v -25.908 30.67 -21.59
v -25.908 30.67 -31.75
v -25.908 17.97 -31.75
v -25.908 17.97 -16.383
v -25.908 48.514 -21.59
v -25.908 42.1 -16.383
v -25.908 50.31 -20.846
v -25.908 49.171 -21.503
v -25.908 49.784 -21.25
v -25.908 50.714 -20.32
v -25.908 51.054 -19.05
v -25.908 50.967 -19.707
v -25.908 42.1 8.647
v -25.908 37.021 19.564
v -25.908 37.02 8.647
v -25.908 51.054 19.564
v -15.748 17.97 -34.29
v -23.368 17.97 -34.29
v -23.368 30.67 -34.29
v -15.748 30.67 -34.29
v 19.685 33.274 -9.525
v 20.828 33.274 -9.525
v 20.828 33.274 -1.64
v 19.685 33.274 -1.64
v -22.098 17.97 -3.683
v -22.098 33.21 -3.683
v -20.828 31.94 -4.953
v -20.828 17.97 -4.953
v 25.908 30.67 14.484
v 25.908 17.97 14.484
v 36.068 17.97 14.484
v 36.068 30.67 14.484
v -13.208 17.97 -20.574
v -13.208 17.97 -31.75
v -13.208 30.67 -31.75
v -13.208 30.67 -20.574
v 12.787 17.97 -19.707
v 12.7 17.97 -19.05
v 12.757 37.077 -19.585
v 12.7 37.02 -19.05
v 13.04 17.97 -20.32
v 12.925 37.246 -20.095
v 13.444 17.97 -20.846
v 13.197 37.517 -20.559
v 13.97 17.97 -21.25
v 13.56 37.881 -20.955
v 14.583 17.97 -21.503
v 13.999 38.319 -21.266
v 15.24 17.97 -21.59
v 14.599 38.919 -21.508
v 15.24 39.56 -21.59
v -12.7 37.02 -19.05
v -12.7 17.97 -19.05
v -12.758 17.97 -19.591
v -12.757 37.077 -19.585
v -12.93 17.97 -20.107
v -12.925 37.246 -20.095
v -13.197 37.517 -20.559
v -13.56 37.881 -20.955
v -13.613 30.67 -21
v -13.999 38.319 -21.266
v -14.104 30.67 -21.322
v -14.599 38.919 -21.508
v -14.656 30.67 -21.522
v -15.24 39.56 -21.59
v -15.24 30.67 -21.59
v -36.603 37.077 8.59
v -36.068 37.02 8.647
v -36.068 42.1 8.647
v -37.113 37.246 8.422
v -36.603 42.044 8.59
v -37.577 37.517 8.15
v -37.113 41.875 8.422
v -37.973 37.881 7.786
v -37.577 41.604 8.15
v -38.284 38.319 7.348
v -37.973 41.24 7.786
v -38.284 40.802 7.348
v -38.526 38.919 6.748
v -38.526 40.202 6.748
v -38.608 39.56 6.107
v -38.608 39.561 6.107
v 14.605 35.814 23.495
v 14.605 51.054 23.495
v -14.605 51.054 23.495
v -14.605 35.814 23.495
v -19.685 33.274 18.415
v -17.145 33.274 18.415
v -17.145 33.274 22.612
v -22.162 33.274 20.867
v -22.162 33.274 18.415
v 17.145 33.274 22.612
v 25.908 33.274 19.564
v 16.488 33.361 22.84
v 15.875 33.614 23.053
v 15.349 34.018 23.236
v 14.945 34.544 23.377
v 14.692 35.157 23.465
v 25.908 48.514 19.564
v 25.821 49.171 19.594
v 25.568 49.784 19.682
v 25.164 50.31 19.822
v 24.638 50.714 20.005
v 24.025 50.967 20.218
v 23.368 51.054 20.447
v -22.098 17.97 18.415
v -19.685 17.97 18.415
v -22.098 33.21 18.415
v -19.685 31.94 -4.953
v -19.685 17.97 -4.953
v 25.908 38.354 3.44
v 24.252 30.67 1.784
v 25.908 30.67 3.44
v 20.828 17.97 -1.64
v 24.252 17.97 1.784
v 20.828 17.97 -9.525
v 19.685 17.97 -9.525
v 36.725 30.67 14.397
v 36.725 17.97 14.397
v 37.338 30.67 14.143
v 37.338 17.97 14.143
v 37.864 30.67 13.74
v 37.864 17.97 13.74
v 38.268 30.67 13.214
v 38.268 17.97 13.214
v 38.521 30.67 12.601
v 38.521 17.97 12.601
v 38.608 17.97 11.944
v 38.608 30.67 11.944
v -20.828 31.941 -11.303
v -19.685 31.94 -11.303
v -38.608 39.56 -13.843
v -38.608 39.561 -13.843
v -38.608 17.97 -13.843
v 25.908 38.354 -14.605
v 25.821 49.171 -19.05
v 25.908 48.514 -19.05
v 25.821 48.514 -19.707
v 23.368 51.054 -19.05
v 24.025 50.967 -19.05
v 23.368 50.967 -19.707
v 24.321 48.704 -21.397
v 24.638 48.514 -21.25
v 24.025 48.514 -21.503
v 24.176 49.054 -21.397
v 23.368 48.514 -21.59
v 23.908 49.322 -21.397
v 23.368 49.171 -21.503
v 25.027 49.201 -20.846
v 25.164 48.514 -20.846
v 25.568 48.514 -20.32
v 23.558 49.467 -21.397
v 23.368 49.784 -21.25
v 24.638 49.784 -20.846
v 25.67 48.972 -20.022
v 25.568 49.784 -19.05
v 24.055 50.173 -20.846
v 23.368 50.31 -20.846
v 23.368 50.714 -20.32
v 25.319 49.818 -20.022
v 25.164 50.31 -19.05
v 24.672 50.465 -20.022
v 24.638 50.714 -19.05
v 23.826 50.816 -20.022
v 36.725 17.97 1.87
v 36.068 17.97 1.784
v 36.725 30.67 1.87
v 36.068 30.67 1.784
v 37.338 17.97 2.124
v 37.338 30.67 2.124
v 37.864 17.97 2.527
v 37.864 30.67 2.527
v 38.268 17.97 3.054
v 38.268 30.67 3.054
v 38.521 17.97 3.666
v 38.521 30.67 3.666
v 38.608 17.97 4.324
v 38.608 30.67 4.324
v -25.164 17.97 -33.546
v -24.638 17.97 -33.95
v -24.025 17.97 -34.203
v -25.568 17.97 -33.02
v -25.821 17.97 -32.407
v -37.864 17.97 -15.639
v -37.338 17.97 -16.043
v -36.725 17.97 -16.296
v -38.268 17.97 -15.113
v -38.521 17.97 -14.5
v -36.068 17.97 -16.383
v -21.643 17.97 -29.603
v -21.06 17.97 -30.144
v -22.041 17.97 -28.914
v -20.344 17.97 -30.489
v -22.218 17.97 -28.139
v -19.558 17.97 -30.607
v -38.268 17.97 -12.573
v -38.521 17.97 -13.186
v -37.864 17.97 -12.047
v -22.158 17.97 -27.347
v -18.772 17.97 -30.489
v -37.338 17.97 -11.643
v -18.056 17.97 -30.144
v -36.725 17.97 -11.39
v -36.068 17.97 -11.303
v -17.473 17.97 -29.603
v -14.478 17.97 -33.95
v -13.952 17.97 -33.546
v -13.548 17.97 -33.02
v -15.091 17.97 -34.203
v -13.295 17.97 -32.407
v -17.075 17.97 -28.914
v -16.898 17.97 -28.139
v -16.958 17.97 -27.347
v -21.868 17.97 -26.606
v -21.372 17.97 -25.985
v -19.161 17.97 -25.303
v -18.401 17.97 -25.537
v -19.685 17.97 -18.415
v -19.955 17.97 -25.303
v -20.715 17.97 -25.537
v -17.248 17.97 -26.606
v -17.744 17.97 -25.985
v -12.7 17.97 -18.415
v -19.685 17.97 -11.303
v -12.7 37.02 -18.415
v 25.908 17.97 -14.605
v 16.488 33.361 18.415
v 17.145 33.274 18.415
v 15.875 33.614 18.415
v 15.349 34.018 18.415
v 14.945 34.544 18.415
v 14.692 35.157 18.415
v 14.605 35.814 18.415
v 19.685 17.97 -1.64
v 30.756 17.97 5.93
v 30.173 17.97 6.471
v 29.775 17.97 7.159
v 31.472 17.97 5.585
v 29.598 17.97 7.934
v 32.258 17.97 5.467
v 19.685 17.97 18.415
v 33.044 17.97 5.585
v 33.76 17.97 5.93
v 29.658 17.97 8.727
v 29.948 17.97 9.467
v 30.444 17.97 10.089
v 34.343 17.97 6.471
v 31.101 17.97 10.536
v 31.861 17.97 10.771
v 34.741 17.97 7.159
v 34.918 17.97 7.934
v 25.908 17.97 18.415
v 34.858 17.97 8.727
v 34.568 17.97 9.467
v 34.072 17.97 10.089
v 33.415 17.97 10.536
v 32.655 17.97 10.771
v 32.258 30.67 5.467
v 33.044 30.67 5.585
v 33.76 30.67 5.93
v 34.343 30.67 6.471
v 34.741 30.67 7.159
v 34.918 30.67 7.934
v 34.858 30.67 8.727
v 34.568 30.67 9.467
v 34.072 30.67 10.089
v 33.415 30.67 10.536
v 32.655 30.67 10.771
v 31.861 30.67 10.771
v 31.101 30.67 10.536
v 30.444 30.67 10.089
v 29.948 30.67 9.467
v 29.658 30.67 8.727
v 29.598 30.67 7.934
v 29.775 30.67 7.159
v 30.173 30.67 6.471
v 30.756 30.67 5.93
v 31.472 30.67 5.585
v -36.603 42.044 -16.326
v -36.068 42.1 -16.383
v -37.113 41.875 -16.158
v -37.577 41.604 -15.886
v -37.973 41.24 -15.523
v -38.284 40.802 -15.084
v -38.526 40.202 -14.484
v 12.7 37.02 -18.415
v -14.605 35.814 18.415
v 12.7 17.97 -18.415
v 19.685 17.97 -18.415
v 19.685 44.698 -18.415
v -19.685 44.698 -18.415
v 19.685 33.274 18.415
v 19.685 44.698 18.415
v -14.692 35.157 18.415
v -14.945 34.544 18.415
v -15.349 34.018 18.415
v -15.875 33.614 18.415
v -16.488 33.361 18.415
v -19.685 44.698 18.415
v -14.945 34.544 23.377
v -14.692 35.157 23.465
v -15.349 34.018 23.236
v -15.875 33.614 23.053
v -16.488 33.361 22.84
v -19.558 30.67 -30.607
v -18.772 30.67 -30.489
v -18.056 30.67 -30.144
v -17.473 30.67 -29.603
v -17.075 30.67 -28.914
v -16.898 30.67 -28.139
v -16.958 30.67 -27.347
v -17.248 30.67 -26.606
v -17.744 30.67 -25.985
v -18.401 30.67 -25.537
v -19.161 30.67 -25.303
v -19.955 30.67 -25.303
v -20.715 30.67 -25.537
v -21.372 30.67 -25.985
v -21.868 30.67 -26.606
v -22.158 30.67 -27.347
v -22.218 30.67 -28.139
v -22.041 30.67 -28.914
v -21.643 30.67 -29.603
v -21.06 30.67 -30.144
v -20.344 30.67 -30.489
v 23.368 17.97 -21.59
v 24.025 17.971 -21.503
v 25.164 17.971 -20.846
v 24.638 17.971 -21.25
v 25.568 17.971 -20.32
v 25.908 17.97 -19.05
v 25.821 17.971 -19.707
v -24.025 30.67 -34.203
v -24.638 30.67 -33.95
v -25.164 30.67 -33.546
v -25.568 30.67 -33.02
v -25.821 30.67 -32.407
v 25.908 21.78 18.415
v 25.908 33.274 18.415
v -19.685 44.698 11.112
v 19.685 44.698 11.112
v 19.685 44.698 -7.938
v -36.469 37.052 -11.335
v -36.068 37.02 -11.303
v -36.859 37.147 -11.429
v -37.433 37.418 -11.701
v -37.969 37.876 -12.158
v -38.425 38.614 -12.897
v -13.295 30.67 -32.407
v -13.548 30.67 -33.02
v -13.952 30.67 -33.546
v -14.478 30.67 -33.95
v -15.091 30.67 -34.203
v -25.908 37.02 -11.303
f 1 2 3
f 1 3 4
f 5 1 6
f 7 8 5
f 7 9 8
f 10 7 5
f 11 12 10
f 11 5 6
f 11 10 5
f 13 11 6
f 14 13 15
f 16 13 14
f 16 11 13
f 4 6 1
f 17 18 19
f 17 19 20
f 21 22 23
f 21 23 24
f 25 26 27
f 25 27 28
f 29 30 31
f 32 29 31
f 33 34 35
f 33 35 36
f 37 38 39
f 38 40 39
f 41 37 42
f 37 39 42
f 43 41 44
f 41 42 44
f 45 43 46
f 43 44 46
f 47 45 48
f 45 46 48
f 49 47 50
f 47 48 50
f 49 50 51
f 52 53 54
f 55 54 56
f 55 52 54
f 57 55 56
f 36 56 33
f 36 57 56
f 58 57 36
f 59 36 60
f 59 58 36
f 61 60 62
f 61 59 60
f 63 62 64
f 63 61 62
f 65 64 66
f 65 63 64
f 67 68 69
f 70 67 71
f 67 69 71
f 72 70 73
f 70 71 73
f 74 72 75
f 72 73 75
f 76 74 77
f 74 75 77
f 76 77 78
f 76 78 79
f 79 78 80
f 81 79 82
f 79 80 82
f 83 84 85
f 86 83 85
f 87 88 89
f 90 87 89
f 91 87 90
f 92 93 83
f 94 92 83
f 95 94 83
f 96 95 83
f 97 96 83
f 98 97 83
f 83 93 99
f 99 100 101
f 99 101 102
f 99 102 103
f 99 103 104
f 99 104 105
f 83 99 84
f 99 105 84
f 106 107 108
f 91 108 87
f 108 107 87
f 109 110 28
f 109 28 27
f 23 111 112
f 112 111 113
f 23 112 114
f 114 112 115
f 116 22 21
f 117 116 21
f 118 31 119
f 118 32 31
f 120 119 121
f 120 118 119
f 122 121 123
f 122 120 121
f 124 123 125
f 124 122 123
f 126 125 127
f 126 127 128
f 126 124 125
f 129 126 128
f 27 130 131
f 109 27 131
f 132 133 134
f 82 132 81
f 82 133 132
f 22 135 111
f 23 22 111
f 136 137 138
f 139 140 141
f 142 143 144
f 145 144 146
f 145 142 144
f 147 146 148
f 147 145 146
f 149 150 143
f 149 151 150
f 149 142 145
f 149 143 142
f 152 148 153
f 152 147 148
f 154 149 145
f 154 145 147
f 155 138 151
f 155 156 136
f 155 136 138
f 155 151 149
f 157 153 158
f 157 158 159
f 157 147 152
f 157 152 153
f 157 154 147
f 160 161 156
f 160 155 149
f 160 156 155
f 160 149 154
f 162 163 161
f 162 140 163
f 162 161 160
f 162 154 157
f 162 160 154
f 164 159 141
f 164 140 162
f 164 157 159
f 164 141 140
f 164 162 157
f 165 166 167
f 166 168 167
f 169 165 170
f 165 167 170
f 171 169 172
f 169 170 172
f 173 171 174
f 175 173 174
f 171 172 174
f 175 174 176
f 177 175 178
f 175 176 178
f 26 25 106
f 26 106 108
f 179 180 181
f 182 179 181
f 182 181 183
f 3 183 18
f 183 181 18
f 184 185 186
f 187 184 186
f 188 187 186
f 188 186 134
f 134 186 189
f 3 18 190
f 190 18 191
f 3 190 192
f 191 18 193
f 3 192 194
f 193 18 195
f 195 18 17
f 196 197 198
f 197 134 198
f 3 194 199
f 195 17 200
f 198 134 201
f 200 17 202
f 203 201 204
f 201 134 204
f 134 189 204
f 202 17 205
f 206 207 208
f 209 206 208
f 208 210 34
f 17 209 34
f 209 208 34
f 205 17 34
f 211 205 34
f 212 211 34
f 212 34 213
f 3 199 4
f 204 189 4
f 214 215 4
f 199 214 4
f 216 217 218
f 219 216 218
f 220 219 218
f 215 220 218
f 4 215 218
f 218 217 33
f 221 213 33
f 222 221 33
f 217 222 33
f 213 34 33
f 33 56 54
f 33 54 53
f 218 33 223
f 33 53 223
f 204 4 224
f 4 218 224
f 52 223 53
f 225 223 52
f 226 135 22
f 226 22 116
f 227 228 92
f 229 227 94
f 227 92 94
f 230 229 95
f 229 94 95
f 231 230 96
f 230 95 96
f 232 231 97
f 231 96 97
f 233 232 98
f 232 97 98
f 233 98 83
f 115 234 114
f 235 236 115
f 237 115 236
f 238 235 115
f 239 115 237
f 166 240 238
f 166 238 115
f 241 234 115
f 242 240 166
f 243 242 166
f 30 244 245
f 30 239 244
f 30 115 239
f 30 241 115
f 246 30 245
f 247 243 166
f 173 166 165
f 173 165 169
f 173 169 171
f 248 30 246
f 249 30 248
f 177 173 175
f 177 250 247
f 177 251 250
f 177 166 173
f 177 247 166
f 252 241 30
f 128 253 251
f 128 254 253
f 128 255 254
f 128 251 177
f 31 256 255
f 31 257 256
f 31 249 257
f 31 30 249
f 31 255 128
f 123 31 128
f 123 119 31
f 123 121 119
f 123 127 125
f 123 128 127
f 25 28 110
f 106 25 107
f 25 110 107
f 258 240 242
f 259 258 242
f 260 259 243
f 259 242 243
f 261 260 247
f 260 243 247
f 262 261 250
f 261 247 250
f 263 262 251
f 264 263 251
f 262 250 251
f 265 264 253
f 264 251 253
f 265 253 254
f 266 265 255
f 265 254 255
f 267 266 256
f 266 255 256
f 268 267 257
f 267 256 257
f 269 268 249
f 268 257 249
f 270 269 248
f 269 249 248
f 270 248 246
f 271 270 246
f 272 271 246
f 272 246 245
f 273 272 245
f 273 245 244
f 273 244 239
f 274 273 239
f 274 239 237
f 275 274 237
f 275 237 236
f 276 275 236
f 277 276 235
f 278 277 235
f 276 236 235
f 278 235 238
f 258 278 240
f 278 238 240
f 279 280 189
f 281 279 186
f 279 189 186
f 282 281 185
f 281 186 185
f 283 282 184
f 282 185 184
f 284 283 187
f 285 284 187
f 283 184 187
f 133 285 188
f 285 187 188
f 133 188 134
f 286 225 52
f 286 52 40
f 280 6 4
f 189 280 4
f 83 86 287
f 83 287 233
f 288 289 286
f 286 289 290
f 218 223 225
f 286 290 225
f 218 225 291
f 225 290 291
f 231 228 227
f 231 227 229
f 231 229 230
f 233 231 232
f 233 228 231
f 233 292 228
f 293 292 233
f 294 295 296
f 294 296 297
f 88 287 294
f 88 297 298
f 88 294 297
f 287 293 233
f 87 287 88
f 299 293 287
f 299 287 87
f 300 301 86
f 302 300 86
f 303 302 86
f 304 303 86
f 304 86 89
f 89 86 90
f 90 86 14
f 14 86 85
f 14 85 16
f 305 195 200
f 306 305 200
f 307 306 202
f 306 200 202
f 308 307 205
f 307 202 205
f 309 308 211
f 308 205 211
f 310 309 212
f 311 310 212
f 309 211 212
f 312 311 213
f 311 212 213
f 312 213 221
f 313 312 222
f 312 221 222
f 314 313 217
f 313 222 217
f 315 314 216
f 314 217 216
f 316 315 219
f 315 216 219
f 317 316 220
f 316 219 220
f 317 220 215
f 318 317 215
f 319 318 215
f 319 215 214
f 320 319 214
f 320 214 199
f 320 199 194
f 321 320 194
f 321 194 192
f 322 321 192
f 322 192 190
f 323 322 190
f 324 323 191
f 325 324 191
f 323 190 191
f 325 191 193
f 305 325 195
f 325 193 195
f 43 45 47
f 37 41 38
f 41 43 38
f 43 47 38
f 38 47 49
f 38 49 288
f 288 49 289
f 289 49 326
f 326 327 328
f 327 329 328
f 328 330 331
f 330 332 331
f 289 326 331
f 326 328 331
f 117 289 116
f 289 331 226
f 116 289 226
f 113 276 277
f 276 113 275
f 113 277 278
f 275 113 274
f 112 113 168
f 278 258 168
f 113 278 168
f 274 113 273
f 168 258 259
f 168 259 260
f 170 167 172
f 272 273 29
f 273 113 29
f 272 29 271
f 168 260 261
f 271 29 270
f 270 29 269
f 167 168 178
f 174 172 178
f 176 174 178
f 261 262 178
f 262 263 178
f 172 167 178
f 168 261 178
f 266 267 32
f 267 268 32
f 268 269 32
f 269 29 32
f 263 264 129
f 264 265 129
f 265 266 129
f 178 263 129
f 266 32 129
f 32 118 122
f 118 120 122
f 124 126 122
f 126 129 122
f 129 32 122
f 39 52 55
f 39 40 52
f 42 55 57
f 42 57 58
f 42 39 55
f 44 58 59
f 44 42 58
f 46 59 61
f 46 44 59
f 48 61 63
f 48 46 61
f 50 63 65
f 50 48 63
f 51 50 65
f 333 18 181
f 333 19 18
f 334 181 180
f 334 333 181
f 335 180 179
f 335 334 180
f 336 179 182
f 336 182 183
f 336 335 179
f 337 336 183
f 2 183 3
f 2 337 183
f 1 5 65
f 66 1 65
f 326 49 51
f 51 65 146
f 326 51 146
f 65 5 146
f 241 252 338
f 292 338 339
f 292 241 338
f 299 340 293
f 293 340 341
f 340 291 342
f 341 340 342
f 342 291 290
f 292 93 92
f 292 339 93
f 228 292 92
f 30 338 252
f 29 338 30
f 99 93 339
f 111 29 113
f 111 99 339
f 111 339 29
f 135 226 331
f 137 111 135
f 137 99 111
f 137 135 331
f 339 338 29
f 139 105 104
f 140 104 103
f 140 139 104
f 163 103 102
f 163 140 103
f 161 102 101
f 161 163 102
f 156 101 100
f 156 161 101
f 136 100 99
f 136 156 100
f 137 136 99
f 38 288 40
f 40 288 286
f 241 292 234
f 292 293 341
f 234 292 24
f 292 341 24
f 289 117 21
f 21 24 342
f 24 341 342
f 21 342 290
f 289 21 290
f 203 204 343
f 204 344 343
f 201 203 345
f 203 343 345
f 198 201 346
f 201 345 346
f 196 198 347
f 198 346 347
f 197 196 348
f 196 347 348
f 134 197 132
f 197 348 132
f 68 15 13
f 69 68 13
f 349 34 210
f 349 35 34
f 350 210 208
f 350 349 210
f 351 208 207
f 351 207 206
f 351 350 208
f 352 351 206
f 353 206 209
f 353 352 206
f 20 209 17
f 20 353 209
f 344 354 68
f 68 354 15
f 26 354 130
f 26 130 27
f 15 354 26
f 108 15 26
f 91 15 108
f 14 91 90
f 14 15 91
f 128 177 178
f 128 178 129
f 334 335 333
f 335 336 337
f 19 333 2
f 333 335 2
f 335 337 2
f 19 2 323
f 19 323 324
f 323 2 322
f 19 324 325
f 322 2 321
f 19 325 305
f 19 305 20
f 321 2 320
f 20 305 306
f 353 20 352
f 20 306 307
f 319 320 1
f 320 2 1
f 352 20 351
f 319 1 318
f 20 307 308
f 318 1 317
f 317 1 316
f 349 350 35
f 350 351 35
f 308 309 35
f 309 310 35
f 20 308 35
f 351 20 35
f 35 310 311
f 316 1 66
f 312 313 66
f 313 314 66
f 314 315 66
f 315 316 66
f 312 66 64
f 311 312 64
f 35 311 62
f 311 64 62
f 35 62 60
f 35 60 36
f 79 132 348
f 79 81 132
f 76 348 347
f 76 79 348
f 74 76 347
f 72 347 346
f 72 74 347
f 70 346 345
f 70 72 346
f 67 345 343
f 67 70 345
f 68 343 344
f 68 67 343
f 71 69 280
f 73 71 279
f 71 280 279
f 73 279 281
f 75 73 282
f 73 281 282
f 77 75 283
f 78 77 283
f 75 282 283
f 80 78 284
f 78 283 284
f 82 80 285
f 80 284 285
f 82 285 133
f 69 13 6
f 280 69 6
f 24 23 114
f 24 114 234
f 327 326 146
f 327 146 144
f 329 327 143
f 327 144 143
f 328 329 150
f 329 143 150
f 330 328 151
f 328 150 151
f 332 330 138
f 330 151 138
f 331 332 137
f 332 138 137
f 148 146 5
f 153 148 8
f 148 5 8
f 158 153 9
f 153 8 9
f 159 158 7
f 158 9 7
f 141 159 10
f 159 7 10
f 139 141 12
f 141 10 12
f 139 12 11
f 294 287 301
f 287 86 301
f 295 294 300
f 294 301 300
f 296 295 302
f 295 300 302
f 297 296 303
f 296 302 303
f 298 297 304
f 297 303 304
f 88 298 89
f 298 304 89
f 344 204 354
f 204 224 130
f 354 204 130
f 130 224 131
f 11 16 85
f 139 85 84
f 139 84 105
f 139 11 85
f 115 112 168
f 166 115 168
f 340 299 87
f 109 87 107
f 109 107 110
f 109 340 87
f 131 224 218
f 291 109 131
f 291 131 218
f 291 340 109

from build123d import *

# Parameters (mm, degrees)
SKETCH1_W            = 45.72
SKETCH1_H            = 43.18
BOSS_EXTRUDE1_DEPTH  = 31.75
SKETCH2_W            = 39.37
SKETCH2_H            = 36.83
CUT_EXTRUDE3_DEPTH   = 25.4
SKETCH3_W            = 45.72
SKETCH3_H            = 31.75
CUT_EXTRUDE5_DEPTH   = 3.175
BOSS_EXTRUDE4_DEPTH  = 38.1
SKETCH7_W            = 39.37
SKETCH7_H            = 25.151618727
BOSS_EXTRUDE5_DEPTH  = 36.83
SKETCH8_W            = 40.005
SKETCH8_H            = 69.85
BOSS_EXTRUDE6_DEPTH  = 6.35
SKETCH9_W            = 40.005
SKETCH9_H            = 69.85
BOSS_EXTRUDE7_DEPTH  = 6.35
CUT_EXTRUDE8_DEPTH   = 61.468
SKETCH13_W           = 58.42
SKETCH13_H           = 26.3525
BOSS_EXTRUDE8_DEPTH  = 16.002
CUT_EXTRUDE9_DEPTH   = 16.51
SKETCH15_W           = 37.994827887
SKETCH15_H           = 16.002
BOSS_EXTRUDE9_DEPTH  = 5.08
SKETCH16_W           = 58.42
SKETCH16_H           = 40.005
CUT_EXTRUDE11_DEPTH  = 38.1
SKETCH17_W           = 9.525
SKETCH17_H           = 12.7
BOSS_EXTRUDE10_DEPTH = 13.97
SKETCH18_W           = 9.525
SKETCH18_H           = 12.7
BOSS_EXTRUDE11_DEPTH = 13.97
SKETCH19_W           = 39.37
SKETCH19_H           = 3.81
BOSS_EXTRUDE14_DEPTH = 5.08
CUT_EXTRUDE12_DEPTH  = 3.81
BOSS_EXTRUDE22_DEPTH = 3.809999
BOSS_EXTRUDE23_START = -1e-06
BOSS_EXTRUDE23_DEPTH = 21.34162
BOSS_EXTRUDE24_DEPTH = 6.598381
SKETCH40_W           = 39.37
SKETCH40_H           = 36.83
BOSS_EXTRUDE25_DEPTH = 4.826
SKETCH42_W           = 37.994827887
SKETCH42_H           = 16.002
BOSS_EXTRUDE26_DEPTH = 3.302
SKETCH43_W           = 39.37
SKETCH43_H           = 13.582012484
CUT_EXTRUDE13_DEPTH  = 6.35
SKETCH45_W           = 39.37
SKETCH45_H           = 13.582012484
BOSS_EXTRUDE27_DEPTH = 19.05
CUT_EXTRUDE15_DEPTH  = 3.302
CUT_EXTRUDE16_DEPTH  = 3.302
SKETCH48_W           = 3.302
SKETCH48_H           = 36.576
CUT_EXTRUDE17_DEPTH  = 3.302
SKETCH49_W           = 3.302
SKETCH49_H           = 36.576
CUT_EXTRUDE18_DEPTH  = 3.302
SKETCH50_W           = 63.22676162
SKETCH50_H           = 45.986337428
CUT_EXTRUDE19_DEPTH  = 16.002
SKETCH51_W           = 54.973573954
SKETCH51_H           = 46.584394505
CUT_EXTRUDE20_DEPTH  = 18.796
SKETCH52_W           = 6.223
SKETCH52_H           = 20.055366997
SKETCH52_H_2         = 8.89
BOSS_EXTRUDE28_DEPTH = 15.3035
SKETCH53_W           = 12.7
SKETCH53_H           = 3.81
BOSS_EXTRUDE29_DEPTH = 10.16
SKETCH54_W           = 12.7
SKETCH54_H           = 3.81
BOSS_EXTRUDE30_DEPTH = 10.16
CUT_EXTRUDE21_DEPTH  = 12.7
CUT_EXTRUDE22_DEPTH  = 12.7
SKETCH60_R           = 2.667
CUT_EXTRUDE25_DEPTH  = 10.16
SKETCH62_W           = 29.21
SKETCH62_H           = 5.08
CUT_EXTRUDE27_DEPTH  = 2.54
SKETCH63_W           = 25.4
SKETCH63_H           = 38.1
CUT_EXTRUDE28_DEPTH  = 3.175
SKETCH64_W           = 12.102561389
SKETCH64_H           = 15.659817378
SKETCH64_W_2         = 11.935696887
SKETCH64_H_2         = 14.711913551
CUT_EXTRUDE29_DEPTH  = 3.81
SKETCH65_W           = 12.7
SKETCH65_H           = 12.7
SKETCH65_R           = 2.667
BOSS_EXTRUDE31_DEPTH = 12.7
SKETCH66_W           = 6.35
SKETCH66_H           = 13.97
CUT_EXTRUDE30_DEPTH  = 85.737175224
SKETCH68_W           = 3.81
SKETCH68_H           = 13.97
CUT_EXTRUDE31_DEPTH  = 29.718
CHAMFER1_SIZE        = 5.08
BOSS_EXTRUDE32_DEPTH = 12.7
FILLET8_R            = 2.54
FILLET9_R            = 2.54
FILLET13_R           = 2.54
FILLET14_R           = 2.54
FILLET1_R            = 2.54
FILLET2_R            = 2.54
FILLET17_R           = 2.54
CHAMFER2_SIZE        = 1.27


with BuildPart() as part:
    # Sketch1 → Boss-Extrude1 (new body)
    with BuildSketch(Plane(origin=(0, 0, 0), x_dir=(1, 0, 0), z_dir=(0, 1, 0))):
        Rectangle(SKETCH1_W, SKETCH1_H)
    extrude(amount=BOSS_EXTRUDE1_DEPTH)

    # Sketch2 → Cut-Extrude3 (cut)
    with BuildSketch(Plane(origin=(0, 31.75, 0), x_dir=(1, 0, 0), z_dir=(0, 1, 0))):
        Rectangle(SKETCH2_W, SKETCH2_H)
    extrude(amount=-CUT_EXTRUDE3_DEPTH, mode=Mode.SUBTRACT)

    # Sketch3 → Cut-Extrude5 (cut)
    with BuildSketch(Plane.XY.offset(21.59)):
        with Locations((0, 15.875)):
            Rectangle(SKETCH3_W, SKETCH3_H)
    extrude(amount=-CUT_EXTRUDE5_DEPTH, mode=Mode.SUBTRACT)

    # Sketch6 → Boss-Extrude4 (add)
    with BuildSketch(Plane(origin=(0, 31.75, 0), x_dir=(1, 0, 0), z_dir=(0, 1, 0))):
        Polygon((-22.86, -18.415), (-19.685, -18.415), (-19.685, 18.415), (19.685, 18.415), (19.685, -18.415), (22.86, -18.415), (22.86, 21.59), (-22.86, 21.59), align=None)
    extrude(amount=BOSS_EXTRUDE4_DEPTH)

    # Sketch7 → Boss-Extrude5 (add)
    with BuildSketch(Plane.XY.offset(-18.415)):
        with Locations((0, 57.274190637)):
            Rectangle(SKETCH7_W, SKETCH7_H)
    extrude(amount=BOSS_EXTRUDE5_DEPTH)

    # Sketch8 → Boss-Extrude6 (add)
    with BuildSketch(Plane(origin=(22.86, 0, 0), x_dir=(0, 0, -1), z_dir=(1, 0, 0))):
        with Locations((1.5875, 34.925)):
            Rectangle(SKETCH8_W, SKETCH8_H)
    extrude(amount=BOSS_EXTRUDE6_DEPTH)

    # Sketch9 → Boss-Extrude7 (add)
    with BuildSketch(Plane.ZY.offset(22.86)):
        with Locations((-1.5875, 34.925)):
            Rectangle(SKETCH9_W, SKETCH9_H)
    extrude(amount=BOSS_EXTRUDE7_DEPTH)

    # Sketch11 → Cut-Extrude8 (cut)
    with BuildSketch(Plane.ZY.offset(29.21)):
        Polygon((4.7625, 58.280393757), (-1.5875, 58.280393757), (-7.9375, 58.280393757), (-7.9375, 44.310393757), (4.7625, 44.310393757), align=None)
    extrude(amount=-CUT_EXTRUDE8_DEPTH, mode=Mode.SUBTRACT)

    # Sketch13 → Boss-Extrude8 (add)
    with BuildSketch(Plane(origin=(0, 69.85, 0), x_dir=(1, 0, 0), z_dir=(0, 1, 0))):
        with Locations((0, 8.41375)):
            Rectangle(SKETCH13_W, SKETCH13_H)
    extrude(amount=BOSS_EXTRUDE8_DEPTH)

    # Sketch14 → Cut-Extrude9 (cut)
    with BuildSketch(Plane(origin=(0, 0, -21.59), x_dir=(-1, 0, 0), z_dir=(0, 0, -1))):
        Polygon((10.16, 85.852), (0, 85.852), (-10.16, 85.852), (-10.16, 73.175571961), (-3.81, 73.175571961), (10.16, 73.175571961), align=None)
    extrude(amount=-CUT_EXTRUDE9_DEPTH, mode=Mode.SUBTRACT)

    # Sketch15 → Boss-Extrude9 (add)
    with BuildSketch(Plane.XY.offset(4.7625)):
        with Locations((0.097658191, 77.851)):
            Rectangle(SKETCH15_W, SKETCH15_H)
    extrude(amount=BOSS_EXTRUDE9_DEPTH)

    # Sketch16 → Cut-Extrude11 (cut)
    with BuildSketch(Plane.XZ):
        with Locations((0, -1.5875)):
            Rectangle(SKETCH16_W, SKETCH16_H)
    extrude(amount=-CUT_EXTRUDE11_DEPTH, mode=Mode.SUBTRACT)

    # Sketch17 → Boss-Extrude10 (add)
    with BuildSketch(Plane(origin=(0, 44.310393757, 0), x_dir=(1, 0, 0), z_dir=(0, 1, 0))):
        with Locations((24.4475, 1.5875)):
            Rectangle(SKETCH17_W, SKETCH17_H)
    extrude(amount=BOSS_EXTRUDE10_DEPTH)

    # Sketch18 → Boss-Extrude11 (add)
    with BuildSketch(Plane(origin=(0, 44.310393757, 0), x_dir=(1, 0, 0), z_dir=(0, 1, 0))):
        with Locations((-24.4475, 1.5875)):
            Rectangle(SKETCH18_W, SKETCH18_H)
    extrude(amount=BOSS_EXTRUDE11_DEPTH)

    # Sketch19 → Boss-Extrude14 (add)
    with BuildSketch(Plane.XY.offset(18.415)):
        with Locations((0, 46.603381273)):
            Rectangle(SKETCH19_W, SKETCH19_H)
    extrude(amount=BOSS_EXTRUDE14_DEPTH)

    # Sketch21 → Cut-Extrude12 (cut)
    with BuildSketch(Plane.XZ.offset(-44.698381273)):
        Polygon((-19.685, 18.415), (-19.685, 23.495), (-14.605, 23.495), align=None)
        Polygon((19.685, 18.415), (19.685, 23.495), (14.605, 23.495), align=None)
    extrude(amount=-CUT_EXTRUDE12_DEPTH, mode=Mode.SUBTRACT)

    # Sketch36 → Boss-Extrude22 (add)
    with BuildSketch(Plane.XZ.offset(-44.698381273)):
        Polygon((-14.605, 23.495), (-29.21, 18.415), (-14.605, 18.415), align=None)
        Polygon((14.605, 23.495), (29.21, 18.415), (14.605, 18.415), align=None)
    extrude(amount=-BOSS_EXTRUDE22_DEPTH)

    # Sketch37 → Boss-Extrude23 (add)
    with BuildSketch(Plane(origin=(0, 48.508381273, 0), x_dir=(1, 0, 0), z_dir=(0, 1, 0)).offset(BOSS_EXTRUDE23_START)):
        Polygon((-29.21, -18.415), (-14.605, -23.495), (14.605, -23.495), (29.21, -18.415), align=None)
    extrude(amount=BOSS_EXTRUDE23_DEPTH)

    # Sketch39 → Boss-Extrude24 (add)
    with BuildSketch(Plane.XZ.offset(-44.698381273)):
        Polygon((-29.21, 18.415), (-14.605, 23.495), (14.605, 23.495), (29.21, 18.415), align=None)
    extrude(amount=BOSS_EXTRUDE24_DEPTH)

    # Sketch40 → Boss-Extrude25 (add)
    with BuildSketch(Plane(origin=(0, 38.1, 0), x_dir=(-1, 0, 0), z_dir=(0, -1, 0))):
        Polygon((29.21, 21.59), (-29.21, 21.59), (-29.21, -18.415), (-14.605, -23.495), (14.605, -23.495), (29.21, -18.415), align=None)
        Rectangle(SKETCH40_W, SKETCH40_H, mode=Mode.SUBTRACT)
    extrude(amount=BOSS_EXTRUDE25_DEPTH)

    # Sketch42 → Boss-Extrude26 (add)
    with BuildSketch(Plane.XY.offset(9.8425)):
        with Locations((0.097658191, 77.851)):
            Rectangle(SKETCH42_W, SKETCH42_H)
    extrude(amount=BOSS_EXTRUDE26_DEPTH)

    # Sketch43 → Cut-Extrude13 (cut)
    with BuildSketch(Plane(origin=(0, 0, 4.7625), x_dir=(-1, 0, 0), z_dir=(0, 0, -1))):
        with Locations((0, 51.489387515)):
            Rectangle(SKETCH43_W, SKETCH43_H)
    extrude(amount=-CUT_EXTRUDE13_DEPTH, mode=Mode.SUBTRACT)

    # Sketch45 → Boss-Extrude27 (add)
    with BuildSketch(Plane.XY.offset(-7.9375)):
        with Locations((0, 51.489387515)):
            Rectangle(SKETCH45_W, SKETCH45_H)
    extrude(amount=BOSS_EXTRUDE27_DEPTH)

    # Sketch46 → Cut-Extrude15 (cut)
    with BuildSketch(Plane.ZY.offset(29.21)):
        Polygon((-21.59, 85.852), (-21.59, 33.274), (18.415, 33.274), (18.415, 69.85), (13.1445, 69.85), (13.1445, 85.852), align=None)
    extrude(amount=-CUT_EXTRUDE15_DEPTH, mode=Mode.SUBTRACT)

    # Sketch47 → Cut-Extrude16 (cut)
    with BuildSketch(Plane(origin=(29.21, 0, 0), x_dir=(0, 0, -1), z_dir=(1, 0, 0))):
        Polygon((-4.7625, 85.852), (-4.7625, 69.85), (-18.415, 69.85), (-18.415, 33.274), (21.59, 33.274), (21.59, 85.852), align=None)
    extrude(amount=-CUT_EXTRUDE16_DEPTH, mode=Mode.SUBTRACT)

    # Sketch48 → Cut-Extrude17 (cut)
    with BuildSketch(Plane(origin=(0, 0, 18.415), x_dir=(-1, 0, 0), z_dir=(0, 0, -1))):
        with Locations((-27.559, 51.562)):
            Rectangle(SKETCH48_W, SKETCH48_H)
    extrude(amount=-CUT_EXTRUDE17_DEPTH, mode=Mode.SUBTRACT)

    # Sketch49 → Cut-Extrude18 (cut)
    with BuildSketch(Plane(origin=(0, 0, 18.415), x_dir=(-1, 0, 0), z_dir=(0, 0, -1))):
        with Locations((27.559, 51.562)):
            Rectangle(SKETCH49_W, SKETCH49_H)
    extrude(amount=-CUT_EXTRUDE18_DEPTH, mode=Mode.SUBTRACT)

    # Sketch50 → Cut-Extrude19 (cut)
    with BuildSketch(Plane(origin=(0, 85.852, 0), x_dir=(1, 0, 0), z_dir=(0, 1, 0))):
        with Locations((5.70538081, -1.403168714)):
            Rectangle(SKETCH50_W, SKETCH50_H)
    extrude(amount=-CUT_EXTRUDE19_DEPTH, mode=Mode.SUBTRACT)

    # Sketch51 → Cut-Extrude20 (cut)
    with BuildSketch(Plane(origin=(0, 69.85, 0), x_dir=(1, 0, 0), z_dir=(0, 1, 0))):
        with Locations((1.578786977, -1.702197253)):
            Rectangle(SKETCH51_W, SKETCH51_H)
    extrude(amount=-CUT_EXTRUDE20_DEPTH, mode=Mode.SUBTRACT)

    # Sketch52 → Boss-Extrude28 (add)
    with BuildSketch(Plane(origin=(0, 33.274, 0), x_dir=(-1, 0, 0), z_dir=(0, -1, 0))):
        with Locations((-22.7965, -8.387316502)):
            Rectangle(SKETCH52_W, SKETCH52_H)
        with Locations((-22.7965, 13.97)):
            Rectangle(SKETCH52_W, SKETCH52_H_2)
        Polygon((-25.908, 18.415), (-19.685, 18.415), (19.685, 18.415), (19.685, 21.59), (-25.908, 21.59), align=None)
        Polygon((19.685, 21.59), (19.685, 18.415), (19.685, -18.415), (25.908, -18.415), (25.908, 21.59), align=None)
    extrude(amount=BOSS_EXTRUDE28_DEPTH)

    # Sketch53 → Boss-Extrude29 (add)
    with BuildSketch(Plane(origin=(25.908, 0, 0), x_dir=(0, 0, -1), z_dir=(1, 0, 0))):
        with Locations((-12.065, 19.8755)):
            Rectangle(SKETCH53_W, SKETCH53_H)
    extrude(amount=BOSS_EXTRUDE29_DEPTH)

    # Sketch54 → Boss-Extrude30 (add)
    with BuildSketch(Plane.ZY.offset(25.908)):
        with Locations((12.065, 19.8755)):
            Rectangle(SKETCH54_W, SKETCH54_H)
    extrude(amount=BOSS_EXTRUDE30_DEPTH)

    # Sketch55 → Cut-Extrude21 (cut)
    with BuildSketch(Plane(origin=(0, 21.7805, 0), x_dir=(1, 0, 0), z_dir=(0, 1, 0))):
        with BuildLine():
            ThreePointArc((36.068, -13.335), (34.418983891, -16.765983891), (30.988, -18.415))
            Line((30.988, -18.415), (36.068, -18.415))
            Line((36.068, -18.415), (36.068, -13.335))
        make_face()
    extrude(amount=-CUT_EXTRUDE21_DEPTH, mode=Mode.SUBTRACT)

    # Sketch56 → Cut-Extrude22 (cut)
    with BuildSketch(Plane(origin=(0, 21.7805, 0), x_dir=(1, 0, 0), z_dir=(0, 1, 0))):
        with BuildLine():
            Line((-36.068, -18.415), (-30.988, -18.415))
            ThreePointArc((-30.988, -18.415), (-34.418983891, -16.765983891), (-36.068, -13.335))
            Line((-36.068, -13.335), (-36.068, -18.415))
        make_face()
    extrude(amount=-CUT_EXTRUDE22_DEPTH, mode=Mode.SUBTRACT)

    # Sketch60 → Cut-Extrude25 (cut)
    with BuildSketch(Plane(origin=(0, 21.7805, 0), x_dir=(1, 0, 0), z_dir=(0, 1, 0))):
        with Locations(Location((30.353, -12.7, 0), (0, 0, 270))):
            Circle(SKETCH60_R)
        with Locations(Location((-30.353, -12.7, 0), (0, 0, 270))):
            Circle(SKETCH60_R)
    extrude(amount=-CUT_EXTRUDE25_DEPTH, mode=Mode.SUBTRACT)

    # Sketch62 → Cut-Extrude27 (cut)
    with BuildSketch(Plane.XZ.offset(-33.274)):
        with Locations((0, 20.955)):
            Rectangle(SKETCH62_W, SKETCH62_H)
    extrude(amount=-CUT_EXTRUDE27_DEPTH, mode=Mode.SUBTRACT)

    # Sketch63 → Cut-Extrude28 (cut)
    with BuildSketch(Plane.XY.offset(-18.415)):
        with Locations((0, 17.9705)):
            Rectangle(SKETCH63_W, SKETCH63_H)
    extrude(amount=-CUT_EXTRUDE28_DEPTH, mode=Mode.SUBTRACT)

    # Sketch64 → Cut-Extrude29 (cut)
    with BuildSketch(Plane.XZ.offset(-17.9705)):
        with Locations((-31.959280695, 13.544908689)):
            Rectangle(SKETCH64_W, SKETCH64_H)
        with Locations((31.875848444, 13.070956776)):
            Rectangle(SKETCH64_W_2, SKETCH64_H_2)
    extrude(amount=-CUT_EXTRUDE29_DEPTH, mode=Mode.SUBTRACT)

    # Sketch65 → Boss-Extrude31 (add)
    # profile 1 of 2: a face of its own
    with BuildSketch(Plane.XZ.offset(-17.9705)):
        with Locations((32.258, 8.133521739)):
            Rectangle(SKETCH65_W, SKETCH65_H)
        with Locations(Location((32.258, 8.133521739, 0), (0, 0, 270))):
            Circle(SKETCH65_R, mode=Mode.SUBTRACT)
    # profile 2 of 2: a face of its own
    with BuildSketch(Plane.XZ.offset(-17.9705)):
        with Locations((-19.558, -27.94)):
            Rectangle(SKETCH65_W, SKETCH65_H)
        with Locations(Location((-19.558, -27.94, 0), (0, 0, 270))):
            Circle(SKETCH65_R, mode=Mode.SUBTRACT)
    extrude(amount=-BOSS_EXTRUDE31_DEPTH)

    # Sketch66 → Cut-Extrude30 (cut, through all)
    with BuildSketch(Plane(origin=(-19.685, 0, 0), x_dir=(0, 0, -1), z_dir=(1, 0, 0))):
        with Locations((8.128, 24.9555)):
            Rectangle(SKETCH66_W, SKETCH66_H)
    extrude(amount=-CUT_EXTRUDE30_DEPTH, mode=Mode.SUBTRACT)

    # Sketch68 → Cut-Extrude31 (cut)
    with BuildSketch(Plane.XY.offset(18.415)):
        with Locations((-24.003, 24.9555)):
            Rectangle(SKETCH68_W, SKETCH68_H)
    extrude(amount=-CUT_EXTRUDE31_DEPTH, mode=Mode.SUBTRACT)

    # Chamfer1
    chamfer1_edges = [part.edges().sort_by_distance(p)[0] for p in [
        (25.908, 33.274, -5.582683498),
        (25.908, 25.62225, -1.640366997),
        (25.908, 25.62225, -9.525),
        (-25.908, 31.9405, 3.556),
    ]]
    chamfer(chamfer1_edges, length=CHAMFER1_SIZE)

    # Sketch67 → Boss-Extrude32 (add)
    with BuildSketch(Plane.ZY.offset(25.908)):
        Polygon((-11.303, 17.9705), (-11.303, 37.0205), (8.646633003, 37.0205), (8.646633003, 42.1005), (-9.398, 42.1005), (-16.383, 42.1005), (-16.383, 17.9705), align=None)
    extrude(amount=BOSS_EXTRUDE32_DEPTH)

    # Fillet8
    fillet8_edges = [part.edges().sort_by_distance(p)[0] for p in [
        (14.605, 33.274, 20.955),
    ]]
    fillet(fillet8_edges, radius=FILLET8_R - 0.0001)  # a hair under: the kernel refuses the full size

    # Fillet9
    fillet9_edges = [part.edges().sort_by_distance(p)[0] for p in [
        (-14.605, 33.274, 20.955),
    ]]
    fillet(fillet9_edges, radius=FILLET9_R - 0.0001)  # a hair under: the kernel refuses the full size

    # Fillet13
    fillet13_edges = [part.edges().sort_by_distance(p)[0] for p in [
        (-12.7, 27.4955, -21.59),
        (12.7, 27.4955, -21.59),
        (0, 37.0205, -21.59),
    ]]
    fillet(fillet13_edges, radius=FILLET13_R)

    # Fillet14
    fillet14_edges = [part.edges().sort_by_distance(p)[0] for p in [
        (-13.208, 24.3205, -34.29),
        (-25.908, 24.3205, -34.29),
        (38.608, 24.3205, 14.483521739),
        (38.608, 24.3205, 1.783521739),
    ]]
    fillet(fillet14_edges, radius=FILLET14_R)

    # Fillet1
    fillet1_edges = [part.edges().sort_by_distance(p)[0] for p in [
        (25.908, 51.054, -1.01323913),
    ]]
    fillet(fillet1_edges, radius=FILLET1_R)

    # Fillet2
    fillet2_edges = [part.edges().sort_by_distance(p)[0] for p in [
        (25.908, 33.24225, -21.59),
        (-1.27, 51.054, -21.59),
        (25.164051224, 50.310051224, -21.59),
    ]]
    fillet(fillet2_edges, radius=FILLET2_R)

    # Fillet17
    fillet17_edges = [part.edges().sort_by_distance(p)[0] for p in [
        (-38.608, 39.5605, 8.646633003),
        (-38.608, 37.0205, -1.328183498),
        (-38.608, 42.1005, -3.868183498),
        (-38.608, 30.0355, -16.383),
        (-38.608, 27.4955, -11.303),
    ]]
    fillet(fillet17_edges, radius=FILLET17_R - 0.0001)  # a hair under: the kernel refuses the full size

    # Chamfer2
    chamfer2_edges = [part.edges().sort_by_distance(p)[0] for p in [
        (-22.098, 25.5905, -4.953),
    ]]
    chamfer(chamfer2_edges, length=CHAMFER2_SIZE)


solid = part.part
